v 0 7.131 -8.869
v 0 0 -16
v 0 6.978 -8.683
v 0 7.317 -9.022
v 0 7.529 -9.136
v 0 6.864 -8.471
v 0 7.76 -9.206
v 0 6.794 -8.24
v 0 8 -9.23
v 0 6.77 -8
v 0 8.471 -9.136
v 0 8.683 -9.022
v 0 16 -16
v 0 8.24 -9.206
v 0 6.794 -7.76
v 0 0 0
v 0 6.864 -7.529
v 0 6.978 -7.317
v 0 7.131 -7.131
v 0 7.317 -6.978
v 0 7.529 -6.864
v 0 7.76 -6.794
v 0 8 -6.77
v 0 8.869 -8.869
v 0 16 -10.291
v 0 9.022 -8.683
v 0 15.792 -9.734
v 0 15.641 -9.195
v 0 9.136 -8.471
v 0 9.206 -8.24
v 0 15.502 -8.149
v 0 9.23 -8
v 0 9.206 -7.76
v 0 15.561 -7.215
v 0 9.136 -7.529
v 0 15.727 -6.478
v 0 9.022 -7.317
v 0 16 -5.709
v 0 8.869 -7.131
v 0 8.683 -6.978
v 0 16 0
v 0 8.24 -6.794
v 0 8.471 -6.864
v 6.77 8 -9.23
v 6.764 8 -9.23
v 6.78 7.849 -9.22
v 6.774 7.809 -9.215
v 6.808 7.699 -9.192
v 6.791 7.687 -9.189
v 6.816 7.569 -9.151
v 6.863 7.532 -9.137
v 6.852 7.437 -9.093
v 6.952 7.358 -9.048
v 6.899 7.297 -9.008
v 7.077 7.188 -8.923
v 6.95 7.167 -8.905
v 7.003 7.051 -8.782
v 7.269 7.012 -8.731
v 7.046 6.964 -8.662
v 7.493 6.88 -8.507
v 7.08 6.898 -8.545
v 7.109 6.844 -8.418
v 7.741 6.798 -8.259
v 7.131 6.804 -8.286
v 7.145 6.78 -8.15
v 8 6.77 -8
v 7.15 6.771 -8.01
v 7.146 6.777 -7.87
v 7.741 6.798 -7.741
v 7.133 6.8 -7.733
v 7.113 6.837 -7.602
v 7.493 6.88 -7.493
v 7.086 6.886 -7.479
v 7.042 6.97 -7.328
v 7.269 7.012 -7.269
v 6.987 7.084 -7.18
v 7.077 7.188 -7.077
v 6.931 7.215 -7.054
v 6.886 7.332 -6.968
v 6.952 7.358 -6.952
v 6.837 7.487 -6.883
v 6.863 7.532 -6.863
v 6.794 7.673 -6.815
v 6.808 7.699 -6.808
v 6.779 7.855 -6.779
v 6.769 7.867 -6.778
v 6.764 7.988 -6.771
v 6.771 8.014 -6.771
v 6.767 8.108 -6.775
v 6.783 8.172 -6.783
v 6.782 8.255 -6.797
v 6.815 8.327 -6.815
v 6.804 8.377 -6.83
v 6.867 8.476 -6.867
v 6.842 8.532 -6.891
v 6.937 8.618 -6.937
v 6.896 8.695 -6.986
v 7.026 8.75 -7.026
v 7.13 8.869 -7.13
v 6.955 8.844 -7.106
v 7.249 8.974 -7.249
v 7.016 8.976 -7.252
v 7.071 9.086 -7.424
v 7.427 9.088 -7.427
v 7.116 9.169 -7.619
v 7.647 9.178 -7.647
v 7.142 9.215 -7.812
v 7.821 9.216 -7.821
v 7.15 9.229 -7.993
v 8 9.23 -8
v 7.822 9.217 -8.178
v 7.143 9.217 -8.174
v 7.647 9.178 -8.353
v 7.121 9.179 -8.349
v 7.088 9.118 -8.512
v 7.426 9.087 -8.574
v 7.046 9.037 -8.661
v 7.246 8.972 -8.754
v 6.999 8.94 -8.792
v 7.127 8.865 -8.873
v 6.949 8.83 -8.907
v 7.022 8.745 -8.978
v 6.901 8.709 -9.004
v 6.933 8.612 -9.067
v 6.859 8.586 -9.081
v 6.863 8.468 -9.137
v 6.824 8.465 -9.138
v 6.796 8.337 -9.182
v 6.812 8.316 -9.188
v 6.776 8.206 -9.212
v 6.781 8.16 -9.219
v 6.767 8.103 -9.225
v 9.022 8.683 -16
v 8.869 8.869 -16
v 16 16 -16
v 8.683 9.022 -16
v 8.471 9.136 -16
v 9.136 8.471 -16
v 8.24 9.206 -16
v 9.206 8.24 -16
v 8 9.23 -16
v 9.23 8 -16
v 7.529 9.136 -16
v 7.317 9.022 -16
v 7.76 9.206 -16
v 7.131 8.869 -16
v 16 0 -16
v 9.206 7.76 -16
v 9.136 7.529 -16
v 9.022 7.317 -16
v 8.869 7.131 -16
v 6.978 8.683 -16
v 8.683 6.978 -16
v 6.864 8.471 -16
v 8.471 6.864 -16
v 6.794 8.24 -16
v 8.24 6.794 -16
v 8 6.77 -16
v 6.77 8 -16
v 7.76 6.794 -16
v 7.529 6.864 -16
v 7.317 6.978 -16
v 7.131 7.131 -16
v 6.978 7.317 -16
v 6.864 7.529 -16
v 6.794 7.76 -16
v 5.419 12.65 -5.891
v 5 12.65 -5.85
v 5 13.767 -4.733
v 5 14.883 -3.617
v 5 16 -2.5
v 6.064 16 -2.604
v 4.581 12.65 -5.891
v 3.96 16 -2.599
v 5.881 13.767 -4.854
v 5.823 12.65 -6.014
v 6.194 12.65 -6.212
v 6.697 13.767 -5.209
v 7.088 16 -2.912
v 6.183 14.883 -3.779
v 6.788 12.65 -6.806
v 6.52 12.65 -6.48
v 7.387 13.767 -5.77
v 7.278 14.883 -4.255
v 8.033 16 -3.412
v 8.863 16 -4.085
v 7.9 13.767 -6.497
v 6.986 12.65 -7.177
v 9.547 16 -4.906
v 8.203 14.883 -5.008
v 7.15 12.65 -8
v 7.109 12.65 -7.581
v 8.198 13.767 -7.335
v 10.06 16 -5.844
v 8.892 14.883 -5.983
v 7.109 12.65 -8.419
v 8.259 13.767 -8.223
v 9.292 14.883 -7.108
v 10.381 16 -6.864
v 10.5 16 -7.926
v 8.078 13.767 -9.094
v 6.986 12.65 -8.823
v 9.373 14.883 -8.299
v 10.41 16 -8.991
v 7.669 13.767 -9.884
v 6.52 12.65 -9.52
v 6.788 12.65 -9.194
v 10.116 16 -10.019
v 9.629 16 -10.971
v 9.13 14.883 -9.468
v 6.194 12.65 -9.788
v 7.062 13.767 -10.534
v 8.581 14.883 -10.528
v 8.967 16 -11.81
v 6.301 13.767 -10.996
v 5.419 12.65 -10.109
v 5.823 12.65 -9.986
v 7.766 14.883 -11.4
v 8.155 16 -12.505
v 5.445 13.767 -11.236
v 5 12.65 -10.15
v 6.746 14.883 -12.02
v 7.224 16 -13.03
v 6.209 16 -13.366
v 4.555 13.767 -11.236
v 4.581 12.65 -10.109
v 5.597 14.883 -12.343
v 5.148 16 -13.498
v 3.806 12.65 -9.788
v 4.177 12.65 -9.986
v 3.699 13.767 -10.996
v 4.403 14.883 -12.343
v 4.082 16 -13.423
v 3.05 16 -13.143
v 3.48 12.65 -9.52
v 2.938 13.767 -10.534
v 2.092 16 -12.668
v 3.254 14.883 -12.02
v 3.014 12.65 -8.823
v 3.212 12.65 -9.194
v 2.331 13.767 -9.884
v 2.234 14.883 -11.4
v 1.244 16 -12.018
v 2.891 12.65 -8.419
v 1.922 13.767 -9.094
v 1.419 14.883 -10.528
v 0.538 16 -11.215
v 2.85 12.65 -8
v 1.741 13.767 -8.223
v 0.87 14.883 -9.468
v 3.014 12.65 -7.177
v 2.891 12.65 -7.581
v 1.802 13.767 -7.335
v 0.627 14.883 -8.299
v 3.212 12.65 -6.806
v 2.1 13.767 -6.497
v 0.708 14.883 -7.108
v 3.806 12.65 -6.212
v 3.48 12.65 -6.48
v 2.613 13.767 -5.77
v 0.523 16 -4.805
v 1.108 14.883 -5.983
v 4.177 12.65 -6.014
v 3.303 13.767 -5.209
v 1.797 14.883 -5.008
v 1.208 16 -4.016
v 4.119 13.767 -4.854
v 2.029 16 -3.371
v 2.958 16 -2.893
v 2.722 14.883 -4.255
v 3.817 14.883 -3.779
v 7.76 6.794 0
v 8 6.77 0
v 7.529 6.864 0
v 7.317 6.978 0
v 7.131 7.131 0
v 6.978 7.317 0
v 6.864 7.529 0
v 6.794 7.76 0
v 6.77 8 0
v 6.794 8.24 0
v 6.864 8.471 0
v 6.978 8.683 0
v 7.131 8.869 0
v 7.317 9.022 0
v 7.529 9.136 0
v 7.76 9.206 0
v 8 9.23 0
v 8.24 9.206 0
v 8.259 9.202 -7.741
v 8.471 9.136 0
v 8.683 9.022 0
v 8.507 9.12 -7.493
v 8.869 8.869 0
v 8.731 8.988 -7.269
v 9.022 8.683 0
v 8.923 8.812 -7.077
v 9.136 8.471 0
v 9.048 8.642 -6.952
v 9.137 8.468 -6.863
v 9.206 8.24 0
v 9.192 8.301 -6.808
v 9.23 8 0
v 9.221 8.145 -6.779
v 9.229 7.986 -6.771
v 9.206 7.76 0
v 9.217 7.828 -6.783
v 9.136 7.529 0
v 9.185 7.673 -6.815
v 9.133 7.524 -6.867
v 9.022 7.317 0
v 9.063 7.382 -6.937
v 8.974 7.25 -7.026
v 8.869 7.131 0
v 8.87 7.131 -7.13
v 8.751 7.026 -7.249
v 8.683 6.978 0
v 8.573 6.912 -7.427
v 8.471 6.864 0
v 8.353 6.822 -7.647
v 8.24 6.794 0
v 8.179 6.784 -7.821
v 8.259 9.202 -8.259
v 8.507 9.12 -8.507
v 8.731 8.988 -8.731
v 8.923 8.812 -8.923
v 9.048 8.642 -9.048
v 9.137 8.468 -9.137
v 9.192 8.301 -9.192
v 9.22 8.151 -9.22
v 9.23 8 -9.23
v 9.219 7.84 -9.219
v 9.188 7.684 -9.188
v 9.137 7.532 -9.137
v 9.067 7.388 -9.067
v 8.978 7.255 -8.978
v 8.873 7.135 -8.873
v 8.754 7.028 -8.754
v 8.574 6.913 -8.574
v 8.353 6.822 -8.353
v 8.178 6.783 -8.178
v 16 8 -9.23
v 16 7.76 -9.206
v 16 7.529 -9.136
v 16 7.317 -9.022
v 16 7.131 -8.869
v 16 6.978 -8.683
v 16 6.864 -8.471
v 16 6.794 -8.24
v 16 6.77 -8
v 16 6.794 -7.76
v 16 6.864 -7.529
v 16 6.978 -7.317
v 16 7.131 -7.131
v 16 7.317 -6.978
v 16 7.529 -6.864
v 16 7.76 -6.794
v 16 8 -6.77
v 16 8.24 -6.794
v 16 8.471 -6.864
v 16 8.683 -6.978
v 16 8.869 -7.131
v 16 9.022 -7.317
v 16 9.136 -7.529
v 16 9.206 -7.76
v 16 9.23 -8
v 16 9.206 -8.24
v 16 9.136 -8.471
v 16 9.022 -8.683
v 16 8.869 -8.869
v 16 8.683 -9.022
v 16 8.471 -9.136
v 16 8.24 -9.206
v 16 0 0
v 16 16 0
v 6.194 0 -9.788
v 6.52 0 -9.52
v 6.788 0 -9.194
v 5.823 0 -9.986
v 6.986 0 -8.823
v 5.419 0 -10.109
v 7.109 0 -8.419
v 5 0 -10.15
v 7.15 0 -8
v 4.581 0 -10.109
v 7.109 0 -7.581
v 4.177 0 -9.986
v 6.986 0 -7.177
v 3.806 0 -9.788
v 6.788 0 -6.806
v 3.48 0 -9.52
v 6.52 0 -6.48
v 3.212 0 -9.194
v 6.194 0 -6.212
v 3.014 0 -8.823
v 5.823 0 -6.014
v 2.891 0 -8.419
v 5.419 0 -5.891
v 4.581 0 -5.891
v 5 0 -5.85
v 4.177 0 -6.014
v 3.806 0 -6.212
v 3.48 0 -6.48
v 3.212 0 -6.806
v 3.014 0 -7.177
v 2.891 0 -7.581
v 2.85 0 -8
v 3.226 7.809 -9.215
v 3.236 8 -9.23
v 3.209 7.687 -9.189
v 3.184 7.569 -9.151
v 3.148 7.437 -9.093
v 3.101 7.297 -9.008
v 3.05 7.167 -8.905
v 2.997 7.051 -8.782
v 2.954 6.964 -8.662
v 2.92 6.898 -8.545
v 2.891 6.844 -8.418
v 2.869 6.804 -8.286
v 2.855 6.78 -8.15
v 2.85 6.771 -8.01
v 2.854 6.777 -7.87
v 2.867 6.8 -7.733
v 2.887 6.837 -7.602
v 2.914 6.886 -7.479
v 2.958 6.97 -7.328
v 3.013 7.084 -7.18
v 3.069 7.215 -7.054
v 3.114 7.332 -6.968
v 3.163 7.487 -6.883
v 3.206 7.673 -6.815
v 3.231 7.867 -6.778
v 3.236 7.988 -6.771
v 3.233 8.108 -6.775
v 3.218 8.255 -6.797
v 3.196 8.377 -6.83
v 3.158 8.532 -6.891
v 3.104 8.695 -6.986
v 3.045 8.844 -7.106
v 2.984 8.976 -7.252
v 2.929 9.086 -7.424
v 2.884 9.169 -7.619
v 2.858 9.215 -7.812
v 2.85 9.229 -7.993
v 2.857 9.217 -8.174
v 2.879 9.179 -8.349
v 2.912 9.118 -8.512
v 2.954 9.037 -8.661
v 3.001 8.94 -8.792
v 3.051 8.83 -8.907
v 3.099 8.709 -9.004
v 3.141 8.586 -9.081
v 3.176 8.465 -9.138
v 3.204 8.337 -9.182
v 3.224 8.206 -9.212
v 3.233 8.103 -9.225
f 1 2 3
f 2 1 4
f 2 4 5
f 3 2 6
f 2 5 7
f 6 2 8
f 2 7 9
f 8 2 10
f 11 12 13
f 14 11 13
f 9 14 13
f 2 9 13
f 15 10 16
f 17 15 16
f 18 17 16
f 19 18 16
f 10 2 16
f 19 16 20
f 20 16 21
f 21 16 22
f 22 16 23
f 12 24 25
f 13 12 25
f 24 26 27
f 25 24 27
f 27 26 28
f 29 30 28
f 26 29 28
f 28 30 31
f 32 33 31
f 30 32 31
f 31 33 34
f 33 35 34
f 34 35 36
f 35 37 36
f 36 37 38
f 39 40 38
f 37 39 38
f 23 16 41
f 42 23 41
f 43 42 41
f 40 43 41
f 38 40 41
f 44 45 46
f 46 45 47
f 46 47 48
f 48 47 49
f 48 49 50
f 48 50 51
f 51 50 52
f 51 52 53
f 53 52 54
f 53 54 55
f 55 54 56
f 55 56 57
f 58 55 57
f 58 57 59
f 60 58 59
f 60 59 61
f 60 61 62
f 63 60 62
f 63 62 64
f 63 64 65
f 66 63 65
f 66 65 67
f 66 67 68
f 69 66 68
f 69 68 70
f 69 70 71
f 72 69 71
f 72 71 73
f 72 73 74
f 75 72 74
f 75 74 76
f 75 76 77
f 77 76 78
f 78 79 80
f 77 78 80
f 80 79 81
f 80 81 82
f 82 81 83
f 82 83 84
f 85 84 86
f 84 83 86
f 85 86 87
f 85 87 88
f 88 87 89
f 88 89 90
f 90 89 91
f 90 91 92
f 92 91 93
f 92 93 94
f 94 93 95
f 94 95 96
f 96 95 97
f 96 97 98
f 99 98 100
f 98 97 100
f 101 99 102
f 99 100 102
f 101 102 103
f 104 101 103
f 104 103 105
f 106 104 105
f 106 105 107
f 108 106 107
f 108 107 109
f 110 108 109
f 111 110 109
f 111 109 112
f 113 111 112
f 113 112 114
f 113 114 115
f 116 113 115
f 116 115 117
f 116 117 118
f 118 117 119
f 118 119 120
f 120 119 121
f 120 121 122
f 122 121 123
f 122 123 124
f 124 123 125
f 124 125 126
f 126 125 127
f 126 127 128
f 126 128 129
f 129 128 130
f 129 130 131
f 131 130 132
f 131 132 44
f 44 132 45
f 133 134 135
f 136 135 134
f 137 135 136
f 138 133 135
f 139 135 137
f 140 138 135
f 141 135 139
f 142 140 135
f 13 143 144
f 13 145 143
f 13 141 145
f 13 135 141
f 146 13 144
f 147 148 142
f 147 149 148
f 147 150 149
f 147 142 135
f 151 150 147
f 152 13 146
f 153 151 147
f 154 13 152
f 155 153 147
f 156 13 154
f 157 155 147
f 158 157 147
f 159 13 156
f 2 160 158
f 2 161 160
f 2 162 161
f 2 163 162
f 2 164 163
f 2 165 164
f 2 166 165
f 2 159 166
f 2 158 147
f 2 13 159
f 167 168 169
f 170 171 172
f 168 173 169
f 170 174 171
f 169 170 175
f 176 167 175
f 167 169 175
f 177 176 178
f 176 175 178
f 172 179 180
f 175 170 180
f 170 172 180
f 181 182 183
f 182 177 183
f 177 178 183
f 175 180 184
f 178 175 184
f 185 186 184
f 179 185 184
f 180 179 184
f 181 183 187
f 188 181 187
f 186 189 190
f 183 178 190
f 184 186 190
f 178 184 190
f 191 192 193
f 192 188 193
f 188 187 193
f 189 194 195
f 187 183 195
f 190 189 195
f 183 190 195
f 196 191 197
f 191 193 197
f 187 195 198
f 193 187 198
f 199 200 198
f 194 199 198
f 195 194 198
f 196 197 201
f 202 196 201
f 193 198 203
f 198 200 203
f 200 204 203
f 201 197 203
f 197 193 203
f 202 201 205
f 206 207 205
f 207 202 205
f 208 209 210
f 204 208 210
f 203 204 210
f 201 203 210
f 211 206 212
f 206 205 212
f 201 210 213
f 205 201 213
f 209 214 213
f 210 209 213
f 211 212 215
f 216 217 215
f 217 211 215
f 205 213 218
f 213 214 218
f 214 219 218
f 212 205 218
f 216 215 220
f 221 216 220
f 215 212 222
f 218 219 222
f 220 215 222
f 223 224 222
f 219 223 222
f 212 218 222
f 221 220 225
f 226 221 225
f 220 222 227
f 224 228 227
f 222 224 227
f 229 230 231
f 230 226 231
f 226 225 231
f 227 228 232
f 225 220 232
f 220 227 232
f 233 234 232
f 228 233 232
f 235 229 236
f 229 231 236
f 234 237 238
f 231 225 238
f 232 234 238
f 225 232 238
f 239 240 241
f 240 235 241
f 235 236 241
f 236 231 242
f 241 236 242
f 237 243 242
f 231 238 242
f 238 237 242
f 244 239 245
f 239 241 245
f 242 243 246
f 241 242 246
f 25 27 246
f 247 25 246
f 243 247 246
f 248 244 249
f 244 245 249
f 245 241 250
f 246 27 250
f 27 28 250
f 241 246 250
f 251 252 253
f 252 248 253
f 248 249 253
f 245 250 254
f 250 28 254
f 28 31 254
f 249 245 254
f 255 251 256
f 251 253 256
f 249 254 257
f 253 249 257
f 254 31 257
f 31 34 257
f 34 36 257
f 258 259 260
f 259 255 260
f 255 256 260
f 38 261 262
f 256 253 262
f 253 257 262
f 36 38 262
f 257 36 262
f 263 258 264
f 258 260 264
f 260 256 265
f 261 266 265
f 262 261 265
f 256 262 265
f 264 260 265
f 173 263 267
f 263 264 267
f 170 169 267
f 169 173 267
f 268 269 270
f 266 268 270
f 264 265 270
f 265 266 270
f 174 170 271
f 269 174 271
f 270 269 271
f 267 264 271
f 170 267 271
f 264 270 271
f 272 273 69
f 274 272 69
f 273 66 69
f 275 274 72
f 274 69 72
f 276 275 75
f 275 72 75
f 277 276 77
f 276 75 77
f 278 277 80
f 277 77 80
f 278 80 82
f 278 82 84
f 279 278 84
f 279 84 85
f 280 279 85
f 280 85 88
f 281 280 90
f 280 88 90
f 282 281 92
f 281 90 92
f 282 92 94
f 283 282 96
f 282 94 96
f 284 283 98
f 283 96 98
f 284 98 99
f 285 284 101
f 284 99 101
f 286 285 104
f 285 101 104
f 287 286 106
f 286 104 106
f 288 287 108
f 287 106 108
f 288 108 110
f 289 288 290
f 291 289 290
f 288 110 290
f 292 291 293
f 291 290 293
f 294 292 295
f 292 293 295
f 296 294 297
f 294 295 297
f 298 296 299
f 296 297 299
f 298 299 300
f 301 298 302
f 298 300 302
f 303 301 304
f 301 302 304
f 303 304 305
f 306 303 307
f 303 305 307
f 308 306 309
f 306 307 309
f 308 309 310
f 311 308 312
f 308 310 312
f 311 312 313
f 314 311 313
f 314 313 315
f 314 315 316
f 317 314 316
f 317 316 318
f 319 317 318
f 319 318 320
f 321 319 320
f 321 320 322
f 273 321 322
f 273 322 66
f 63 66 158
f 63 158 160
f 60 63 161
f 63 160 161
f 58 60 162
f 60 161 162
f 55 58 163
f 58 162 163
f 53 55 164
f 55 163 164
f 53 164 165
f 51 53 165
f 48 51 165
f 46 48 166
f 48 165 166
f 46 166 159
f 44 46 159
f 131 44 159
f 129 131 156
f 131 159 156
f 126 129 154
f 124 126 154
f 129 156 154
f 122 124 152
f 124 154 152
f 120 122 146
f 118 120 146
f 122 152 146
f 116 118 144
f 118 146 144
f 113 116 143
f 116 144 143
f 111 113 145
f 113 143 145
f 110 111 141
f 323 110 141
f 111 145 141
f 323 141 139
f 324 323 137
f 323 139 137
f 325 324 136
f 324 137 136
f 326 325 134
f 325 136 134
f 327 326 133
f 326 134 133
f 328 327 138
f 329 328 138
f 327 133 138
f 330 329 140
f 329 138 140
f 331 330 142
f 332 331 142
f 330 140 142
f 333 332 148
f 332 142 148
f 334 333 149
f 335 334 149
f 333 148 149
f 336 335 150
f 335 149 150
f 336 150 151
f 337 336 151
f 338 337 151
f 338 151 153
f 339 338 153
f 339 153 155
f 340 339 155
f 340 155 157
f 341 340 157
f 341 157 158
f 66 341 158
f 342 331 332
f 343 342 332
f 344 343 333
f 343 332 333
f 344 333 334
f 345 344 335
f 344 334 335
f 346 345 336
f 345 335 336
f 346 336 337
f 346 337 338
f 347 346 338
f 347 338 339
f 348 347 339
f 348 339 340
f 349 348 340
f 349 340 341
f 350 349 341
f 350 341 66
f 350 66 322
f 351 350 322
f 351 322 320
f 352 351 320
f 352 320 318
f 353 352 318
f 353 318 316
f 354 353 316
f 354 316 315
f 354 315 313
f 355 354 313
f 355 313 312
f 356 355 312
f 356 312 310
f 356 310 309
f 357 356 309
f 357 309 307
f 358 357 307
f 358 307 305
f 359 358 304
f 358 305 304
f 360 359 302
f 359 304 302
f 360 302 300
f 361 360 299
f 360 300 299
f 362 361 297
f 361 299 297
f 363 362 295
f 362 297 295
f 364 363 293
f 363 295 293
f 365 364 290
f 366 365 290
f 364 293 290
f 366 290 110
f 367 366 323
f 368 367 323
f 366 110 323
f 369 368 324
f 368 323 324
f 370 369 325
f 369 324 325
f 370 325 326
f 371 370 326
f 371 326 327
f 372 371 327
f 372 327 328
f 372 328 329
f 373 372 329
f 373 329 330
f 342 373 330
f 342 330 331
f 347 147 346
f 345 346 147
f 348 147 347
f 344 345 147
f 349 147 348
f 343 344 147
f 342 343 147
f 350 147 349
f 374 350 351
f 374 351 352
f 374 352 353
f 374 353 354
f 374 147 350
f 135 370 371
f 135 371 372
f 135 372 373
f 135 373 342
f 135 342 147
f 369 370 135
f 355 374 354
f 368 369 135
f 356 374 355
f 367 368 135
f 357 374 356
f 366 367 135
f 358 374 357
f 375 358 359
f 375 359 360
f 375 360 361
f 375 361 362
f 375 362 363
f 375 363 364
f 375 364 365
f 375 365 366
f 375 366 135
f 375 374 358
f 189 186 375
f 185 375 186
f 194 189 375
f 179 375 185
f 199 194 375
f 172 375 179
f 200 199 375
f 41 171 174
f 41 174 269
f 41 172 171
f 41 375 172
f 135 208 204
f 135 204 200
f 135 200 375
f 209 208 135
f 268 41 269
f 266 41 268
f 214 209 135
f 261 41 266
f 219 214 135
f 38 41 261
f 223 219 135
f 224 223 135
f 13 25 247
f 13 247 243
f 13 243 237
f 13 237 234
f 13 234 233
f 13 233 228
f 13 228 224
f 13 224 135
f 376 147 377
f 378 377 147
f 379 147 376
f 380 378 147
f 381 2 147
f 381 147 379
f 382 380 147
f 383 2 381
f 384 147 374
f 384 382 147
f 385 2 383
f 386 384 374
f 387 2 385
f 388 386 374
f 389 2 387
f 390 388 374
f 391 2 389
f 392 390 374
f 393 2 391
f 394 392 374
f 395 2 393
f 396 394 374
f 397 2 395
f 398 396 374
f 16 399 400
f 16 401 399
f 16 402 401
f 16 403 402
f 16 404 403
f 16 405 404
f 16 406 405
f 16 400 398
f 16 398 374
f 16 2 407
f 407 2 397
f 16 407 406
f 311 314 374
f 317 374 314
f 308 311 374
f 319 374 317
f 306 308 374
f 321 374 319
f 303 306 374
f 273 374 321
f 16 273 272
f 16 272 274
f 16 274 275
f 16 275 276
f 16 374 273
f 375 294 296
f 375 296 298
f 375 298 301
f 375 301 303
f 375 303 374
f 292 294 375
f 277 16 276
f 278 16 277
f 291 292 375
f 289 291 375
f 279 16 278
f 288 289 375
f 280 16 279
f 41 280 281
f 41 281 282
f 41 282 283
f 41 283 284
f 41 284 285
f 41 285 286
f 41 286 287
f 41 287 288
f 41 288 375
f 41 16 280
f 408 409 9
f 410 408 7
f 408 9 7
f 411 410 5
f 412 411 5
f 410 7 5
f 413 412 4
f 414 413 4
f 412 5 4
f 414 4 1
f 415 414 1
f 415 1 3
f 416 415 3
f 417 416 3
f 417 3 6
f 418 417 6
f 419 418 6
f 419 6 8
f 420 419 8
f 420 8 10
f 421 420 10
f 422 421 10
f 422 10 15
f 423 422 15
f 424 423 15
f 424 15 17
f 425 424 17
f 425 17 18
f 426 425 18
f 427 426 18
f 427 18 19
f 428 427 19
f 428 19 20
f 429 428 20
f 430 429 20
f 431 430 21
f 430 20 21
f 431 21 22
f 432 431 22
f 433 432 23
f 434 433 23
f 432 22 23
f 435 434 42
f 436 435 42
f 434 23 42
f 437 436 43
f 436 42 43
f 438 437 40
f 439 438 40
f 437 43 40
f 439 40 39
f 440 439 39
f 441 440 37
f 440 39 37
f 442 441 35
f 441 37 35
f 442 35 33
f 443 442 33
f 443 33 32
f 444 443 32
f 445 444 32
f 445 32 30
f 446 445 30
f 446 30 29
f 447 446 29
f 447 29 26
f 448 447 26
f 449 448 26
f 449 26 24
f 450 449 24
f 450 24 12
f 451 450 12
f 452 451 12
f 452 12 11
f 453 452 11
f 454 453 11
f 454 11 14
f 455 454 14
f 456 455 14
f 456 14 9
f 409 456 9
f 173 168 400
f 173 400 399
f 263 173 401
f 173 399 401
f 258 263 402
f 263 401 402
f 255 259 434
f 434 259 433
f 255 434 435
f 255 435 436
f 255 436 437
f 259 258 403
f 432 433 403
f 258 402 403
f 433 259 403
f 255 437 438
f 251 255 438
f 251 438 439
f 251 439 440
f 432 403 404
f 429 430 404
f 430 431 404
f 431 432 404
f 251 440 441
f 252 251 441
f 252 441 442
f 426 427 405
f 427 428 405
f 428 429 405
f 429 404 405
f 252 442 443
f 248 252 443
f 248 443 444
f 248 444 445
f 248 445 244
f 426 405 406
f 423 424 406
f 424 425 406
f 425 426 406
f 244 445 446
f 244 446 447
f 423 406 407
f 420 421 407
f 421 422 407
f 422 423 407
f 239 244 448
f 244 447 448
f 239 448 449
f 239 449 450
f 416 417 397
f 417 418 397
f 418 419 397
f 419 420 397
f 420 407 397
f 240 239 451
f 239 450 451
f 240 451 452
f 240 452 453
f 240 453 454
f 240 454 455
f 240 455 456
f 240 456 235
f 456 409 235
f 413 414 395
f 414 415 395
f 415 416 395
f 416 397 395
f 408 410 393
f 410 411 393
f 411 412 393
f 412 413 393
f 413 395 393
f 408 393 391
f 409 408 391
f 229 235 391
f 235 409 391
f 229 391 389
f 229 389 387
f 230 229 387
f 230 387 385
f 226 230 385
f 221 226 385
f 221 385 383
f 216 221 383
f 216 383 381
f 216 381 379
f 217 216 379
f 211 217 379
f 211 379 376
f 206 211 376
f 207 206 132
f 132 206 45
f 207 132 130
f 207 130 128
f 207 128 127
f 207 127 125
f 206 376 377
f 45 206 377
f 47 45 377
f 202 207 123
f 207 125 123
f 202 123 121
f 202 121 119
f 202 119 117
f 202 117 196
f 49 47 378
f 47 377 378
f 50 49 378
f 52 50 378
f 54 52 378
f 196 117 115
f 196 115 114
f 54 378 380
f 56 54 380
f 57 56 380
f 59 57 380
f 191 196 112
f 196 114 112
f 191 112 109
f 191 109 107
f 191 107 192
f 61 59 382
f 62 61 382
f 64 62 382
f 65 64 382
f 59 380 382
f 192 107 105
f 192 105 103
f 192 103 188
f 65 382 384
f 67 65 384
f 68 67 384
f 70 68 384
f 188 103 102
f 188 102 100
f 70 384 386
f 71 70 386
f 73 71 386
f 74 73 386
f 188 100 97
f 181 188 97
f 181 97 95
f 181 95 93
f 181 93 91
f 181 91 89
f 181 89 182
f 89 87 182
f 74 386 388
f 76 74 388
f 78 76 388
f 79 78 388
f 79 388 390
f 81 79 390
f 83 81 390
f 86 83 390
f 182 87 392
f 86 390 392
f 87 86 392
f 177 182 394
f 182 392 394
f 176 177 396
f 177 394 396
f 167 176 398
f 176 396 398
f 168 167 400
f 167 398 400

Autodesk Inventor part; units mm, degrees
ref_plane "YZ Plane" through (0, 0, 0) normal (1, 0, 0) x (0, 1, 0)
ref_plane "XZ Plane" through (0, 0, 0) normal (0, 1, 0) x (-1, 0, 0)
ref_plane "XY Plane" through (0, 0, 0) normal (0, 0, 1) x (1, 0, 0)
sketch "Skizze1" plane through (0, 0, 0) normal (1, 0, 0) x (0, 1, 0)
  line L0 (0, 0) -> (16, 0)
  line L1 (16, 0) -> (16, -16)
  line L2 (16, -16) -> (0, -16)
  line L3 (0, -16) -> (0, 0)
  dimension "d0" = 16
  dimension "d1" = 16
extrude "Extrusion1" add sketch "Skizze1" along normal blind 16
sketch "Skizze2" plane through (0, 16, 0) normal (0, 1, 0) x (1, 0, 0)
  line L0 (5, 8) -> (0, 8)
  line L1 (0, 16) -> (0, 0) projected
  dimension "d4" = 5
hole "Bohrung1" at (5, 16, -8) direction (0, -1, 0) diameter 4.3 end through all countersink diameter 11 countersink angle 90 clearance for "Flachkopfmaschinenschraube" size "M4" standard "ANSI Metrisches M Profil"
sketch "Skizze3" plane through (0, 0, 0) normal (0, 0, 1) x (1, 0, 0)
  line L0 (0, 16) -> (0, 0) projected
  line L1 (0, 8) -> (8, 8)
  dimension "d12" = 8
hole "Bohrung2" at (8, 8, 0) direction (0, 0, -1) diameter 2.459 end through all thread size "M3x0.5" class "6H" standard "ANSI Metric M Profile"
sketch "Skizze4" plane through (16, 0, 0) normal (1, 0, 0) x (0, 0, -1)
  line L0 (10.15, 0) -> (5.85, 0) projected
  line L1 (8, 0) -> (8, 8)
  point P0 (0, 0)
  dimension "d20" = 8
hole "Bohrung3" at (16, 8, -8) direction (-1, 0, 0) diameter 2.459 end through all thread size "M3x0.5" class "6H" standard "ANSI Metric M Profile"
properties part number "Frameblock" material "PC/ABS-Kunststoff, 3DDruck, PLA"
